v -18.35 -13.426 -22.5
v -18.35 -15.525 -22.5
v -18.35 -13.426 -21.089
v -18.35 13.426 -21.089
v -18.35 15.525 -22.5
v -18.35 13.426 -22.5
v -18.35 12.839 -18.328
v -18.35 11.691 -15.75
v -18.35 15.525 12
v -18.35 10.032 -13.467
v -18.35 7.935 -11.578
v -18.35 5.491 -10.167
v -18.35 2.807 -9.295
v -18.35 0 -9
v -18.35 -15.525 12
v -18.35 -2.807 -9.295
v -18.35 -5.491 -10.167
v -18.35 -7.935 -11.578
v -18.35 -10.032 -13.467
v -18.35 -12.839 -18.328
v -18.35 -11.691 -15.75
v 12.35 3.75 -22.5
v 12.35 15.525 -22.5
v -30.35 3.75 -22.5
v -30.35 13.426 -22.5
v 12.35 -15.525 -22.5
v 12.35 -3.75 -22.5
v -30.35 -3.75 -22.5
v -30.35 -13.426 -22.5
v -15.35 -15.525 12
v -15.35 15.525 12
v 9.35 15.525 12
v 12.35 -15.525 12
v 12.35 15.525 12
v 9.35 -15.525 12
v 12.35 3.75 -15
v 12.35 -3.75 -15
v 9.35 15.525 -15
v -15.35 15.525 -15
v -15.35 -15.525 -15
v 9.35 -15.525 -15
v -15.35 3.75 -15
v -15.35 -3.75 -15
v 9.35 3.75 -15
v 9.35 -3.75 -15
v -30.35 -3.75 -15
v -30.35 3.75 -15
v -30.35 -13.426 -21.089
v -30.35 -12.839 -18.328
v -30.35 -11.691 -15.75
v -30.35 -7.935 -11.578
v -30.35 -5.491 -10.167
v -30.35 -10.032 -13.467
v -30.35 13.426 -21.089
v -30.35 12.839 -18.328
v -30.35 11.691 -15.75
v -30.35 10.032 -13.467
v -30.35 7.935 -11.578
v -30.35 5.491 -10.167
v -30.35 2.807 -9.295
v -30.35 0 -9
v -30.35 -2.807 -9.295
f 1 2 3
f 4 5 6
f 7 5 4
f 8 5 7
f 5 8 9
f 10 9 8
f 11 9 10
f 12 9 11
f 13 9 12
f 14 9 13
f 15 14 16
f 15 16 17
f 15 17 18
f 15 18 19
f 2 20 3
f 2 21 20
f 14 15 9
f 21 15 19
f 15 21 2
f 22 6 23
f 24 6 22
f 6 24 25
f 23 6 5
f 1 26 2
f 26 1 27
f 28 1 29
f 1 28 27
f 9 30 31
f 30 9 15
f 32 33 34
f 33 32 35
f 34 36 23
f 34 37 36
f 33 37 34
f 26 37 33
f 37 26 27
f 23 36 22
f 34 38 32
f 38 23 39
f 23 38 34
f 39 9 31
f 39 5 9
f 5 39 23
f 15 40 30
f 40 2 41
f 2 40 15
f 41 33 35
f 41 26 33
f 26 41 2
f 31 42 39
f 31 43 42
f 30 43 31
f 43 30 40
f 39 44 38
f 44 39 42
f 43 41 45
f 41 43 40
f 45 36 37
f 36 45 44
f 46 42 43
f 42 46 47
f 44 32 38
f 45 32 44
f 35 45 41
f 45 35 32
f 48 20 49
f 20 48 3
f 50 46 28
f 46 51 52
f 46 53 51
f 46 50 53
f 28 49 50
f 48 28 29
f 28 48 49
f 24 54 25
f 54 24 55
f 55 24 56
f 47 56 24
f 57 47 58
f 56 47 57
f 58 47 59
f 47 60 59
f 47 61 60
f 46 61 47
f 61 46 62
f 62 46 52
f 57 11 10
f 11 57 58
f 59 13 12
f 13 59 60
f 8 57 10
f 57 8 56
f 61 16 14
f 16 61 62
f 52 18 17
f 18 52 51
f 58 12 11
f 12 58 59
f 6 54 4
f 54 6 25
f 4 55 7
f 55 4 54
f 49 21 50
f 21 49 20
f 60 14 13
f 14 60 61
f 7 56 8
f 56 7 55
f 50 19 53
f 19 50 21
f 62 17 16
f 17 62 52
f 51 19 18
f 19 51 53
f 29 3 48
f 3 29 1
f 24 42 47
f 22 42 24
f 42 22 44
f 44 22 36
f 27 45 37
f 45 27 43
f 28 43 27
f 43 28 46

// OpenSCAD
// [FL_INDEX: keywords="openscad, 3d_parametric, Customizable_Cable_Holder, csg_solid" | COT="Parametric OpenSCAD design from 3DCodeverse"]
// Title: Customizable Cable Holder

// Cable Holder by xifle
// 05.03.2017
// v3

// preview[view:north, tilt:top diagonal]
/* [Parameters] */

// The thickness of the table (mm)
TABLE_HEIGHT = 24.7;

// The depth of the cable holder (mm)
DEPTH = 30;

// diameter of the cable to hold, some space will be added (mm)
CABLE = 6;

// height of the cylinder on top of the cable holder clip (mm)
CYLINDER_HEIGHT = 12;

// wall thickness (mm)
WALL = 3; 

// space between table and wall, this will be at least the thickness of the cable (plus 1.5mm spacing) (mm)
WALLTABLESPACE = 3;

/* [Hidden] */

// additional space for cable
CABLEWSPACE = CABLE+1.5;

$fs = 0.01;
ADDSPACE = max(max(WALLTABLESPACE,CABLEWSPACE),WALL)-WALL;

//ADDSPACE = WALLTABLESPACE-WALL;
OUTER_RADIUS = CABLEWSPACE*1.8;
WIDTH = OUTER_RADIUS*2.3;

rotate([0,180,0])
difference() {
union() {

	translate([TABLE_HEIGHT/2+2*WALL+CYLINDER_HEIGHT/2,0,DEPTH/2+WALL+ADDSPACE])
	rotate([0,90,0])
	cylinder(h=CYLINDER_HEIGHT, r=OUTER_RADIUS, center=true);


	difference() {

	translate([WALL,0,WALL+ADDSPACE/2])
	cube([TABLE_HEIGHT+2*WALL, WIDTH, DEPTH+ADDSPACE ], center=true);

	translate([WALL, WALL,0])
	cube([TABLE_HEIGHT, WIDTH*2, DEPTH], center=true);

	}

}

translate([0,0,DEPTH/2+WALL+OUTER_RADIUS+ADDSPACE])
cube([(TABLE_HEIGHT+2*WALL+CYLINDER_HEIGHT)*2, WIDTH, 2*OUTER_RADIUS], center=true);

translate([0,0,DEPTH/2+WALL+ADDSPACE])
cube([(TABLE_HEIGHT+2*WALL+CYLINDER_HEIGHT)*2, CABLEWSPACE, CABLEWSPACE*2], center=true);

}
